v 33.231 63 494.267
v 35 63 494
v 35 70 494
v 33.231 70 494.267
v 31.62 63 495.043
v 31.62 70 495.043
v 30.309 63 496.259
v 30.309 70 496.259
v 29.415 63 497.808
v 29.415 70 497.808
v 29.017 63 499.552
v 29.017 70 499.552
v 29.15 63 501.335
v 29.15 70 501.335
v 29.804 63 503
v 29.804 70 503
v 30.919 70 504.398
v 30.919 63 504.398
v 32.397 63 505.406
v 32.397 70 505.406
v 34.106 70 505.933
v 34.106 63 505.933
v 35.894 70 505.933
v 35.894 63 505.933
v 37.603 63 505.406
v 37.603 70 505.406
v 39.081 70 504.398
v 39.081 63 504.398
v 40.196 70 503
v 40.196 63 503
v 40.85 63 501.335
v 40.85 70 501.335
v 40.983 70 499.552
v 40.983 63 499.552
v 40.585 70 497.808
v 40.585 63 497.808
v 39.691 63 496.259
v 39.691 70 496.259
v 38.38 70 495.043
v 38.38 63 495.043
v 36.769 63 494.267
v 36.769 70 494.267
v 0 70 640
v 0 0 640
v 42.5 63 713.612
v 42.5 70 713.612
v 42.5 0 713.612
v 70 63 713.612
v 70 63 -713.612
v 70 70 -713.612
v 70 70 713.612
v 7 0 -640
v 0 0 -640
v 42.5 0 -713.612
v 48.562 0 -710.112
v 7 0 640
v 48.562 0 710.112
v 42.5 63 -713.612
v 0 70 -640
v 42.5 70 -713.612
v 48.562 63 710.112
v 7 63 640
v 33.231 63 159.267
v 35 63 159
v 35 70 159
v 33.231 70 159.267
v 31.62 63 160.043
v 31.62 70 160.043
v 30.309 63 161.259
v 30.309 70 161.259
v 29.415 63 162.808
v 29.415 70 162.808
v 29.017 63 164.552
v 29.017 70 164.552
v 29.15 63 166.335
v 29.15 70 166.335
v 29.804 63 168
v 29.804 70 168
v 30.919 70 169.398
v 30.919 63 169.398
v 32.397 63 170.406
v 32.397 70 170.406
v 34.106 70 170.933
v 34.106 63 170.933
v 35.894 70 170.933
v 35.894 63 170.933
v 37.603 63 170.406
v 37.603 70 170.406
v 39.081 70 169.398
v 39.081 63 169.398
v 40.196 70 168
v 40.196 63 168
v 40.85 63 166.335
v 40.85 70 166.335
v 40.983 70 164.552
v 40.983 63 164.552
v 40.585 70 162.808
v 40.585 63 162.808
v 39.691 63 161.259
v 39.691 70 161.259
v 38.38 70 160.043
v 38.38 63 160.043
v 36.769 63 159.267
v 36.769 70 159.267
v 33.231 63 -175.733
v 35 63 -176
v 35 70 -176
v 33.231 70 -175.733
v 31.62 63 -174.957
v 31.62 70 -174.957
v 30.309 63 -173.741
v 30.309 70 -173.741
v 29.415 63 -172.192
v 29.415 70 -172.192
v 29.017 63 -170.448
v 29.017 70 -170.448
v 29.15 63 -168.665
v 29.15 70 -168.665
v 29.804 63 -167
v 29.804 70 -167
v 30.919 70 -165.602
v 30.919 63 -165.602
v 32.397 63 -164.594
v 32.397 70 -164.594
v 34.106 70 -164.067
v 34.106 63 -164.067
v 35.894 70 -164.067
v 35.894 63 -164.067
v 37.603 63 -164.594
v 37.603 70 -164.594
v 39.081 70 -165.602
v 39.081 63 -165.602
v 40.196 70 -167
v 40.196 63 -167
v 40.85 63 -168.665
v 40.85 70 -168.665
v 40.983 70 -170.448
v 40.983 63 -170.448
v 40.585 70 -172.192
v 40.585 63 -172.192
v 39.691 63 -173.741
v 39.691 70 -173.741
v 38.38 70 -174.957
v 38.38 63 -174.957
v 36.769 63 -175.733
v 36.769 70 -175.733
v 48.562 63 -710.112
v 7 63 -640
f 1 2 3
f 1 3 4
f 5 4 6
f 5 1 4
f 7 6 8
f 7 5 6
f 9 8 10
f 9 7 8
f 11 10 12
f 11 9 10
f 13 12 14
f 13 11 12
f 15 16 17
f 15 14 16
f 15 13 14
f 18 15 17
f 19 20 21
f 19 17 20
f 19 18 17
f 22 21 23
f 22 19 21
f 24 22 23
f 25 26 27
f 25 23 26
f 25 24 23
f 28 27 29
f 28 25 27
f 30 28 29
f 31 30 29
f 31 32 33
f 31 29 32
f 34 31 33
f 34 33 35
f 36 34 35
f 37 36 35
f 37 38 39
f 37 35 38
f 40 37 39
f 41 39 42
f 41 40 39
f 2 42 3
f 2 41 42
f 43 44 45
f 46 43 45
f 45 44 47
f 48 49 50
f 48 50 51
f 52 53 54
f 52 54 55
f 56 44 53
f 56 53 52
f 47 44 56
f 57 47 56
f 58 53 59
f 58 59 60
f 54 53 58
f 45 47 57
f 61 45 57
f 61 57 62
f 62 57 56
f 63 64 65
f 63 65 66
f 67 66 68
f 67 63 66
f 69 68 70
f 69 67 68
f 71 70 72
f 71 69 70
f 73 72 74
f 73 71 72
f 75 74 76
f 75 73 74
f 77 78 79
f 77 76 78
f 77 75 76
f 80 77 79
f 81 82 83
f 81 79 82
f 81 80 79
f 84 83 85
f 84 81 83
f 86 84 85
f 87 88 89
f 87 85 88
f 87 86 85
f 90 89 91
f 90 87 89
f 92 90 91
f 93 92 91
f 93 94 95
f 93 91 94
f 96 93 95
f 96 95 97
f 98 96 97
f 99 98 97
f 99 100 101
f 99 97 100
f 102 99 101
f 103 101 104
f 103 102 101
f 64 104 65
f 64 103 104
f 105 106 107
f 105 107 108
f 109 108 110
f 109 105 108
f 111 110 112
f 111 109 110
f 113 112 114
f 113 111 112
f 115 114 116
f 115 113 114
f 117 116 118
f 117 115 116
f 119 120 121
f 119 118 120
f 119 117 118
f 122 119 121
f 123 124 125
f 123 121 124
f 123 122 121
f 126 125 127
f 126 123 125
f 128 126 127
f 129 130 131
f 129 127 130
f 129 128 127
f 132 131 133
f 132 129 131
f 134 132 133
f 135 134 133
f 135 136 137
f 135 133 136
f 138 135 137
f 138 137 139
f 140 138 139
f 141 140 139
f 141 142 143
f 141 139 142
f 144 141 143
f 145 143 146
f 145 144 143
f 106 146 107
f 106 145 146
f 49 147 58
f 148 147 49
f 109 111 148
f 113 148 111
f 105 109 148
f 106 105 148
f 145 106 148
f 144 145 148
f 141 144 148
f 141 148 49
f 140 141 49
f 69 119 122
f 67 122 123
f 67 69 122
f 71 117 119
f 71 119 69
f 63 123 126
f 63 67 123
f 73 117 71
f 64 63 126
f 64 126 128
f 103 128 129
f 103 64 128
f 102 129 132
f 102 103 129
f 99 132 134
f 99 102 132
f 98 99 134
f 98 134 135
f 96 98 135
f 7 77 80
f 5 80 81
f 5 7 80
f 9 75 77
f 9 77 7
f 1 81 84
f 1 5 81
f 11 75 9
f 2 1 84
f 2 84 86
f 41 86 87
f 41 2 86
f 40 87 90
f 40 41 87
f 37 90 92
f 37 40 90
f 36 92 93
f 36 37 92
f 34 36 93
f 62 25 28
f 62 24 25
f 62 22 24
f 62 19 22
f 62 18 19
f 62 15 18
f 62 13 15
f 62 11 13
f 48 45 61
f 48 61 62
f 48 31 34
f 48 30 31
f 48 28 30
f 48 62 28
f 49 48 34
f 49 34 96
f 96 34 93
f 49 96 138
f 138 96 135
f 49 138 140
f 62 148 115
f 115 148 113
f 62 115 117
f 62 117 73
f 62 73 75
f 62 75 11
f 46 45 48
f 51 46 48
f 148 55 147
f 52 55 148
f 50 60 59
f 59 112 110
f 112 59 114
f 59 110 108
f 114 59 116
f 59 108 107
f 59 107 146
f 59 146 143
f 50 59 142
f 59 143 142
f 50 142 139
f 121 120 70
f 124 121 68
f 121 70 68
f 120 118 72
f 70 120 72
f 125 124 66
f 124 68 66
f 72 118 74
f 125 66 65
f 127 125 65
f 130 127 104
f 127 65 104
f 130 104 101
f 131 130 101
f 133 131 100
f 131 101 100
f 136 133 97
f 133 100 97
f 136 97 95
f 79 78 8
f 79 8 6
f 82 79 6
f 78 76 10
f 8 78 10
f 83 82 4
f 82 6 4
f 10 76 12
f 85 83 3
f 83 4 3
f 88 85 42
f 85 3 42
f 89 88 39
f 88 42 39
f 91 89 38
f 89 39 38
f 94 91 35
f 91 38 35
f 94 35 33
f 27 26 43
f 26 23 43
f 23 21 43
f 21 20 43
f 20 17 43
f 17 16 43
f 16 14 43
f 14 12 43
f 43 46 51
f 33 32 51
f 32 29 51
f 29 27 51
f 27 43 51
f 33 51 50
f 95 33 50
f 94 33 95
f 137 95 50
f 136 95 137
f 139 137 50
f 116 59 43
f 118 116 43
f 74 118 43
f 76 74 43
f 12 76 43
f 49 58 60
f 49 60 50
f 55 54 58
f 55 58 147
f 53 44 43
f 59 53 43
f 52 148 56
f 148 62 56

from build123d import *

# Parameters (mm, degrees)
BOSS_EXTRUDE1_DEPTH     = 640
BOSS_EXTRUDE2_DEPTH     = 63
BOSS_EXTRUDE3_DEPTH     = 7
CUT_EXTRUDE1_DEPTH      = 10
CUT_EXTRUDE1_DEPTH_BACK = 10
SKETCH28_R              = 6


with BuildPart() as part:
    # Sketch1 → Boss-Extrude1 (new body)
    with BuildSketch(Plane.XY):
        Polygon((0, 0), (0, 70), (70, 70), (70, 63), (7, 63), (7, 0), align=None)
    extrude(amount=BOSS_EXTRUDE1_DEPTH)

    # Sketch23 → Boss-Extrude2 (add)
    with BuildSketch(Plane(origin=(0, 0, 0), x_dir=(1, 0, 0), z_dir=(0, 1, 0))):
        Polygon((0, -640), (42.5, -713.612159322), (48.562177826, -710.112159322), (7, -640), align=None)
    extrude(amount=BOSS_EXTRUDE2_DEPTH)

    # Sketch25 → Boss-Extrude3 (add)
    with BuildSketch(Plane(origin=(0, 63, 0), x_dir=(1, 0, 0), z_dir=(0, 1, 0))):
        Polygon((70, -640), (0, -640), (42.5, -713.612159322), (70, -713.612159322), align=None)
    extrude(amount=BOSS_EXTRUDE3_DEPTH)

    # Mirror1: part across plane


with BuildPart() as part_1:
    add(part.part)
    add(part.part.mirror(Plane.XY))

    # Sketch28 → Cut-Extrude1 (cut, two sides: drawn at the far end of the back side and taken through both)
    with BuildSketch(Plane(origin=(0, 70, 0), x_dir=(1, 0, 0), z_dir=(0, 1, 0)).offset(-CUT_EXTRUDE1_DEPTH_BACK)):
        with Locations((35, -500)):
            Circle(SKETCH28_R)
        with Locations((35, -165)):
            Circle(SKETCH28_R)
        with Locations((35, 170)):
            Circle(SKETCH28_R)
    extrude(amount=CUT_EXTRUDE1_DEPTH + CUT_EXTRUDE1_DEPTH_BACK, mode=Mode.SUBTRACT)


solid = part_1.part
